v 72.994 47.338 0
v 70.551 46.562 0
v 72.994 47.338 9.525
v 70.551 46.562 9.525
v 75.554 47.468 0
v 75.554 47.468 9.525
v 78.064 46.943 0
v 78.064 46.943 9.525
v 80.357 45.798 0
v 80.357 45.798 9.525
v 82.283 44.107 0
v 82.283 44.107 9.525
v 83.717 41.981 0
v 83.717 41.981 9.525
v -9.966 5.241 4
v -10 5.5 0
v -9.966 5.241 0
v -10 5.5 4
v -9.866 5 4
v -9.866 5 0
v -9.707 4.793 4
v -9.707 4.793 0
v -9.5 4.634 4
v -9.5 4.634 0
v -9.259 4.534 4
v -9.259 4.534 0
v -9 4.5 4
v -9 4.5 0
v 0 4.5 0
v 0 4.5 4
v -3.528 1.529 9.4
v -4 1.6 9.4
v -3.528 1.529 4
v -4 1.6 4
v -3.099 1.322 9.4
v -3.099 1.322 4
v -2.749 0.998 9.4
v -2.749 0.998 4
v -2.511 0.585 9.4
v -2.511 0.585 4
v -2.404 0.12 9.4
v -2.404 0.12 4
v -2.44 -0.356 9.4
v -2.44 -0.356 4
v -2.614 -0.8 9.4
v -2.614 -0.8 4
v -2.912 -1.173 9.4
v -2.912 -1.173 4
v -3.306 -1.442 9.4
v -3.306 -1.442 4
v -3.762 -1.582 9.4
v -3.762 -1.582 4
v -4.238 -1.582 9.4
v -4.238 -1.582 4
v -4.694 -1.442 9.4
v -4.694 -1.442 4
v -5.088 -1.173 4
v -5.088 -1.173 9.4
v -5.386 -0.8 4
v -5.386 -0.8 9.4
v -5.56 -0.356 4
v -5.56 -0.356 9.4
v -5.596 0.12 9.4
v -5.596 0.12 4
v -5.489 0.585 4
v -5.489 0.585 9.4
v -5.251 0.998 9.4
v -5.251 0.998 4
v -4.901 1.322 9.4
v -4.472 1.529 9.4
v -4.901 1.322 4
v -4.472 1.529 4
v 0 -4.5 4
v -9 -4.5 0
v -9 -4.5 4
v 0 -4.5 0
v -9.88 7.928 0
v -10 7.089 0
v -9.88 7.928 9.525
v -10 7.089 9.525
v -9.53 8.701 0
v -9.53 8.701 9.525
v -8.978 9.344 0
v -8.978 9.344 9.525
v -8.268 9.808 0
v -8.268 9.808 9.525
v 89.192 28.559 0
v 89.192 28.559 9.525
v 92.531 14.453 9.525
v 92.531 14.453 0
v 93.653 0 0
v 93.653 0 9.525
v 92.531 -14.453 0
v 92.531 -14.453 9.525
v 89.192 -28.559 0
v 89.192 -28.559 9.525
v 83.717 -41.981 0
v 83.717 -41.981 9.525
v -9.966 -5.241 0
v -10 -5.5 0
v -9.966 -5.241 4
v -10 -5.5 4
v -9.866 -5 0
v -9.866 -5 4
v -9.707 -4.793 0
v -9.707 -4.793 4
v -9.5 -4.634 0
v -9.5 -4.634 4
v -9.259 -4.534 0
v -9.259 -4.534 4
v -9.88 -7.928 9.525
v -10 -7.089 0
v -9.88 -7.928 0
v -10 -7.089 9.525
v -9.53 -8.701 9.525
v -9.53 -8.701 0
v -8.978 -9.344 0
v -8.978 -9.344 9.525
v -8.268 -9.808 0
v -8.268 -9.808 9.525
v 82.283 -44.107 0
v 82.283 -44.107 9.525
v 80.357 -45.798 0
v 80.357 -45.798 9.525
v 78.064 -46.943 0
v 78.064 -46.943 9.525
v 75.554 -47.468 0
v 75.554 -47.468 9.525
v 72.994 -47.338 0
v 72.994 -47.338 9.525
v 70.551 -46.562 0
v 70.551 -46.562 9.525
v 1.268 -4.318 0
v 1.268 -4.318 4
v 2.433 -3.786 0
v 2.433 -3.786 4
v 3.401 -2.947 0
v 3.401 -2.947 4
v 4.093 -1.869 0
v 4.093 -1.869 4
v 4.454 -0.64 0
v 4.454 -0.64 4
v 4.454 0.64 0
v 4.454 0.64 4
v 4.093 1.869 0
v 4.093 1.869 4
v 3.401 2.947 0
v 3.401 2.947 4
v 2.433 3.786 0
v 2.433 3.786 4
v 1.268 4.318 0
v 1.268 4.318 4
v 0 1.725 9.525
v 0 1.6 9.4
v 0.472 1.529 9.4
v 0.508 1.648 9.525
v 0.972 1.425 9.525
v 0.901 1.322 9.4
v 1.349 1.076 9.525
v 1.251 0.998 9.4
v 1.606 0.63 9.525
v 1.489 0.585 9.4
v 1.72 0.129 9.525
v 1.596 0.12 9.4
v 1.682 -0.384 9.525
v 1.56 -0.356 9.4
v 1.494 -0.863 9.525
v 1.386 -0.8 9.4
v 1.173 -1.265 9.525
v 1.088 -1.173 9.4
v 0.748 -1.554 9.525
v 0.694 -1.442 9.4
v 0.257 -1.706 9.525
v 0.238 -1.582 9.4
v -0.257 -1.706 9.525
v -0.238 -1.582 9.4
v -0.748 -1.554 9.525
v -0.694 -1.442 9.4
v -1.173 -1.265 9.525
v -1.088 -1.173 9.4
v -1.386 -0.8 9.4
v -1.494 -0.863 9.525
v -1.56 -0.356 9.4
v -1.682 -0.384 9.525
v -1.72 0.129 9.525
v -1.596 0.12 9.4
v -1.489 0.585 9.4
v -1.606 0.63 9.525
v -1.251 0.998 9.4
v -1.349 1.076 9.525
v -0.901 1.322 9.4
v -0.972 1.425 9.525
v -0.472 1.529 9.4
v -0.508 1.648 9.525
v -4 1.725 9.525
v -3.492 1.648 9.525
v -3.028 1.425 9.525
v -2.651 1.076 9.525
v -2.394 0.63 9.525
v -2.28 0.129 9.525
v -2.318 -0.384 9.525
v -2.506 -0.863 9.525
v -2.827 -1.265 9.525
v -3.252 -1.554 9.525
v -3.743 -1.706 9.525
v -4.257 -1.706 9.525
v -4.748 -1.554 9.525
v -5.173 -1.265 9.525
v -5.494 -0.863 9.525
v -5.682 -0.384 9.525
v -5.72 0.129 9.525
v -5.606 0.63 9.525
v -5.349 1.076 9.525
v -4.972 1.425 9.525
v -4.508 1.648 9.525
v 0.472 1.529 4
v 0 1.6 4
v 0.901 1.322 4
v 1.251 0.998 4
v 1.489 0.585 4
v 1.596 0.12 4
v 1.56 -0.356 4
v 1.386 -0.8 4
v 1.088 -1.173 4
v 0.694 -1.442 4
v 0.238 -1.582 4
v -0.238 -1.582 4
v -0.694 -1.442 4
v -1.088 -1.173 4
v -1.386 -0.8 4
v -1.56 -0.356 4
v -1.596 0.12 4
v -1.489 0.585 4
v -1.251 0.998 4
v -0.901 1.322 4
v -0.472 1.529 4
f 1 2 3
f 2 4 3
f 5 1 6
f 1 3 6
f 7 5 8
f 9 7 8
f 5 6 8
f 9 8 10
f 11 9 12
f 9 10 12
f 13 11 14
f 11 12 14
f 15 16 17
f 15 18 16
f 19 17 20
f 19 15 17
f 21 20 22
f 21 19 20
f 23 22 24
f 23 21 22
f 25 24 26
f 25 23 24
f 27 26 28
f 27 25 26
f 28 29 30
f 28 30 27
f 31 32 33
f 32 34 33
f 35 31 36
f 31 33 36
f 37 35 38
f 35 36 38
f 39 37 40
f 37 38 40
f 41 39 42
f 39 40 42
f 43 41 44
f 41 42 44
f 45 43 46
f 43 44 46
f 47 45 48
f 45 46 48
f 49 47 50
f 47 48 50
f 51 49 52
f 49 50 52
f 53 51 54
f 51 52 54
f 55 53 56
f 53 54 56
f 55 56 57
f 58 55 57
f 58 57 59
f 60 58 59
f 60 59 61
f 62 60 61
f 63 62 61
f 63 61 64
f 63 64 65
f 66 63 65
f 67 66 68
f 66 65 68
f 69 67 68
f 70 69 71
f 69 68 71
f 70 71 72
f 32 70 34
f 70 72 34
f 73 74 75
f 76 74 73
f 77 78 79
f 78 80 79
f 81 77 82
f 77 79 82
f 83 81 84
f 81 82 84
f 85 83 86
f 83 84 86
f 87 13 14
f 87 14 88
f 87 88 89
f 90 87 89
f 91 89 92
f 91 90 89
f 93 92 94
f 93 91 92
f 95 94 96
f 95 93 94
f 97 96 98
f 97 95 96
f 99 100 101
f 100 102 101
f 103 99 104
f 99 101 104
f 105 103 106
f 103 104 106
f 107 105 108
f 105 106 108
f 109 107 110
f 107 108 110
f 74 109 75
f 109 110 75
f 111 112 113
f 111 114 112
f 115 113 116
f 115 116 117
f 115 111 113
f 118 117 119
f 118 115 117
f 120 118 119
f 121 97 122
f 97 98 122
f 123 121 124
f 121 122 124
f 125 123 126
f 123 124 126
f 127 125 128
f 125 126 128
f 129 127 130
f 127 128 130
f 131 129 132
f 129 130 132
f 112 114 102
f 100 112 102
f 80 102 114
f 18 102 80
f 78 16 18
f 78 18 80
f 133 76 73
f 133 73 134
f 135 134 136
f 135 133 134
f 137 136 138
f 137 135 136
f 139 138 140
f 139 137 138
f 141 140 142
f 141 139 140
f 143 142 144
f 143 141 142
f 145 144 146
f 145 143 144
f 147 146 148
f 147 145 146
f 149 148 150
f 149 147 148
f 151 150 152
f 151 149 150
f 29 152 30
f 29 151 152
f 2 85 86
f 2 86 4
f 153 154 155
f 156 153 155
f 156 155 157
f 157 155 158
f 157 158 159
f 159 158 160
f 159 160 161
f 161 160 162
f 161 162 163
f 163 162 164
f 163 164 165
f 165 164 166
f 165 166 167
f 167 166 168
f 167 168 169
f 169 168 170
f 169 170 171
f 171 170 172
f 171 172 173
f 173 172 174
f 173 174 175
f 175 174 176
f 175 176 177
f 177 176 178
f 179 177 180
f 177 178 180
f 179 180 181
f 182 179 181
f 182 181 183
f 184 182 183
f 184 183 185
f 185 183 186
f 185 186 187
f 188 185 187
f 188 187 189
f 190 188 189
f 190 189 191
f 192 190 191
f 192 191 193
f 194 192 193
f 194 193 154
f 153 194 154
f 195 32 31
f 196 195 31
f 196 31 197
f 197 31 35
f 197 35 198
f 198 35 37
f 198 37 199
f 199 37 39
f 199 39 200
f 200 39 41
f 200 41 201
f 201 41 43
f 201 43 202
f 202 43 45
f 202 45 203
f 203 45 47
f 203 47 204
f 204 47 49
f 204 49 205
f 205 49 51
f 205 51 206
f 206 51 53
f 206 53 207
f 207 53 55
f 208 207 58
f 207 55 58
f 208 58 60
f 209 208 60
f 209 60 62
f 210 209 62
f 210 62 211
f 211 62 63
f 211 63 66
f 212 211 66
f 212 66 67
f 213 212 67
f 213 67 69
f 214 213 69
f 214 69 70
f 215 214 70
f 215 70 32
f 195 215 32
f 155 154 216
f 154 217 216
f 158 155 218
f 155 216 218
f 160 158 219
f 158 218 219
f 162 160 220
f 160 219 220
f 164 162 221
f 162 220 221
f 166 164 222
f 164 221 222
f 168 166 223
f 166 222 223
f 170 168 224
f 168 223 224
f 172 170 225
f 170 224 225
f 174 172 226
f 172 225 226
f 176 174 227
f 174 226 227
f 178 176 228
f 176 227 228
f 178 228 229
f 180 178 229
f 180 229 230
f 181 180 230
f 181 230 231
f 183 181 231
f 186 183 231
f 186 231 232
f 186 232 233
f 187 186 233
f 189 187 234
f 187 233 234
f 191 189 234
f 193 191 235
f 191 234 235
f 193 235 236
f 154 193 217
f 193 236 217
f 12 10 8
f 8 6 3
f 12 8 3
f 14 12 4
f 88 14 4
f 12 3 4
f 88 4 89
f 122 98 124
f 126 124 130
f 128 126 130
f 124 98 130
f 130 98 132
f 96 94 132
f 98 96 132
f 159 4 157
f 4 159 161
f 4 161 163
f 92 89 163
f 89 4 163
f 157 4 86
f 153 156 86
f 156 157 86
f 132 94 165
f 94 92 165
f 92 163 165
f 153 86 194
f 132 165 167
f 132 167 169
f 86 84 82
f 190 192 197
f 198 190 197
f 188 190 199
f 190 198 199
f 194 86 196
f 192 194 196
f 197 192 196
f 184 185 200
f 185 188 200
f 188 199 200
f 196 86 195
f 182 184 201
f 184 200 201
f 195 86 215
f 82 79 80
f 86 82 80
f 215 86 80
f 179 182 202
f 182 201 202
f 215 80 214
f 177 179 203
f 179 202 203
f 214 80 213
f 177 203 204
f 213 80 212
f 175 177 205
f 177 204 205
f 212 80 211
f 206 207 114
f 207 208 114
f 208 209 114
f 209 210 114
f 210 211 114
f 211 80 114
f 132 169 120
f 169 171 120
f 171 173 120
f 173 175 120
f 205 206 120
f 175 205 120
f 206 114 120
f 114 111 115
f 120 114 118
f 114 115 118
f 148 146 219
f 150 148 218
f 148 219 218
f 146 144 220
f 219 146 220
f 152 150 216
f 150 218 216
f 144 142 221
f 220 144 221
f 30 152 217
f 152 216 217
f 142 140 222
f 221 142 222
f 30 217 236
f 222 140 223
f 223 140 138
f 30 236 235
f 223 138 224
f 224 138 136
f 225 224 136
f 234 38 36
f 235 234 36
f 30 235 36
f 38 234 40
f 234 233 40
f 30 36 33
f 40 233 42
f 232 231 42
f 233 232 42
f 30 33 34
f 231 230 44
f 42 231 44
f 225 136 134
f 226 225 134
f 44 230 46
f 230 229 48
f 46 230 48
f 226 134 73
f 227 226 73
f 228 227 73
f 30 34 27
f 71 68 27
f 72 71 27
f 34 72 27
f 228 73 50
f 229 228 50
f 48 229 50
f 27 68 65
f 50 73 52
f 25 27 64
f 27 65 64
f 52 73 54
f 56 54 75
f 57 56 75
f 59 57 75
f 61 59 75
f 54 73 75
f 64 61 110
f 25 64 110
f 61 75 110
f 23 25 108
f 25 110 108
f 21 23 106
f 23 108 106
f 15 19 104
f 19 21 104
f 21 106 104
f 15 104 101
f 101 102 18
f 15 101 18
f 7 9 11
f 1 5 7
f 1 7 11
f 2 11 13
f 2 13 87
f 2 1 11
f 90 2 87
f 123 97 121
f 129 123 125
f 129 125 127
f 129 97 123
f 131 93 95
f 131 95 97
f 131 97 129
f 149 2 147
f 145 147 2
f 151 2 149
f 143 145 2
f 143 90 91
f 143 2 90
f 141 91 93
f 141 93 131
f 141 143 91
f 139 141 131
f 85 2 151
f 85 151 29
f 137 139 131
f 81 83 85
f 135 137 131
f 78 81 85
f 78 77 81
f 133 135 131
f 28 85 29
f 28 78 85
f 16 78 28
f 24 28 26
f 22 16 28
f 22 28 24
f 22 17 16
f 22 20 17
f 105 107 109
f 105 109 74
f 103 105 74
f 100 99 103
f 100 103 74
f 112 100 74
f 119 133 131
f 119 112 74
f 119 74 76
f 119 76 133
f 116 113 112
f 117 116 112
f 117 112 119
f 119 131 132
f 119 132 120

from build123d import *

# Parameters (mm, degrees)
BOSS_EXTRUDE1_DEPTH            = 9.525
CUT_EXTRUDE2_DEPTH             = 4
M3_CLEARANCE_HOLE1_D           = 3.2
M3_CLEARANCE_HOLE1_CSINK_D     = 3.45
M3_CLEARANCE_HOLE1_CSINK_ANGLE = 90
FILLET1_R                      = 1
FILLET2_R                      = 3
FILLET3_R                      = 10


with BuildPart() as part:
    # Sketch2 → Boss-Extrude1 (new body)
    with BuildSketch(Plane(origin=(0, 0, 0), x_dir=(0, 1, 0), z_dir=(0, 0, 1))):
        with BuildLine():
            Line((-9, 10), (9, 10))
            Line((9, 10), (50.45475081, -78.9))
            ThreePointArc((50.45475081, -78.9), (0, -93.653039883), (-50.45475081, -78.9))
            Line((-50.45475081, -78.9), (-9, 10))
        make_face()
    extrude(amount=BOSS_EXTRUDE1_DEPTH)

    # Sketch3 → Cut-Extrude2 (cut)
    with BuildSketch(Plane(origin=(0, 0, 0), x_dir=(1, 0, 0), z_dir=(0, 0, -1))):
        with BuildLine():
            Line((-10, -4.5), (-10, 4.5))
            Line((-10, 4.5), (0, 4.5))
            ThreePointArc((0, 4.5), (4.5, 0), (0, -4.5))
            Line((0, -4.5), (-10, -4.5))
        make_face()
    extrude(amount=-CUT_EXTRUDE2_DEPTH, mode=Mode.SUBTRACT)

    # M3 Clearance Hole1 (through all)
    with Locations(Plane(origin=(0, 0, 9.525), x_dir=(0, -1, 0), z_dir=(0, 0, 1))):
        with Locations((0, 0), (0, -4)):
            CounterSinkHole(M3_CLEARANCE_HOLE1_D / 2, M3_CLEARANCE_HOLE1_CSINK_D / 2, counter_sink_angle=M3_CLEARANCE_HOLE1_CSINK_ANGLE)

    # Fillet1
    fillet1_edges = [part.edges().sort_by_distance(p)[0] for p in [
        (-10, 4.5, 2),
        (-10, -4.5, 2),
    ]]
    fillet(fillet1_edges, radius=FILLET1_R)

    # Fillet2
    fillet2_edges = [part.edges().sort_by_distance(p)[0] for p in [
        (-10, -9, 4.7625),
        (-10, 9, 4.7625),
    ]]
    fillet(fillet2_edges, radius=FILLET2_R)

    # Fillet3
    fillet3_edges = [part.edges().sort_by_distance(p)[0] for p in [
        (78.9, 50.45475081, 4.7625),
        (78.9, -50.45475081, 4.7625),
    ]]
    fillet(fillet3_edges, radius=FILLET3_R)


solid = part.part
